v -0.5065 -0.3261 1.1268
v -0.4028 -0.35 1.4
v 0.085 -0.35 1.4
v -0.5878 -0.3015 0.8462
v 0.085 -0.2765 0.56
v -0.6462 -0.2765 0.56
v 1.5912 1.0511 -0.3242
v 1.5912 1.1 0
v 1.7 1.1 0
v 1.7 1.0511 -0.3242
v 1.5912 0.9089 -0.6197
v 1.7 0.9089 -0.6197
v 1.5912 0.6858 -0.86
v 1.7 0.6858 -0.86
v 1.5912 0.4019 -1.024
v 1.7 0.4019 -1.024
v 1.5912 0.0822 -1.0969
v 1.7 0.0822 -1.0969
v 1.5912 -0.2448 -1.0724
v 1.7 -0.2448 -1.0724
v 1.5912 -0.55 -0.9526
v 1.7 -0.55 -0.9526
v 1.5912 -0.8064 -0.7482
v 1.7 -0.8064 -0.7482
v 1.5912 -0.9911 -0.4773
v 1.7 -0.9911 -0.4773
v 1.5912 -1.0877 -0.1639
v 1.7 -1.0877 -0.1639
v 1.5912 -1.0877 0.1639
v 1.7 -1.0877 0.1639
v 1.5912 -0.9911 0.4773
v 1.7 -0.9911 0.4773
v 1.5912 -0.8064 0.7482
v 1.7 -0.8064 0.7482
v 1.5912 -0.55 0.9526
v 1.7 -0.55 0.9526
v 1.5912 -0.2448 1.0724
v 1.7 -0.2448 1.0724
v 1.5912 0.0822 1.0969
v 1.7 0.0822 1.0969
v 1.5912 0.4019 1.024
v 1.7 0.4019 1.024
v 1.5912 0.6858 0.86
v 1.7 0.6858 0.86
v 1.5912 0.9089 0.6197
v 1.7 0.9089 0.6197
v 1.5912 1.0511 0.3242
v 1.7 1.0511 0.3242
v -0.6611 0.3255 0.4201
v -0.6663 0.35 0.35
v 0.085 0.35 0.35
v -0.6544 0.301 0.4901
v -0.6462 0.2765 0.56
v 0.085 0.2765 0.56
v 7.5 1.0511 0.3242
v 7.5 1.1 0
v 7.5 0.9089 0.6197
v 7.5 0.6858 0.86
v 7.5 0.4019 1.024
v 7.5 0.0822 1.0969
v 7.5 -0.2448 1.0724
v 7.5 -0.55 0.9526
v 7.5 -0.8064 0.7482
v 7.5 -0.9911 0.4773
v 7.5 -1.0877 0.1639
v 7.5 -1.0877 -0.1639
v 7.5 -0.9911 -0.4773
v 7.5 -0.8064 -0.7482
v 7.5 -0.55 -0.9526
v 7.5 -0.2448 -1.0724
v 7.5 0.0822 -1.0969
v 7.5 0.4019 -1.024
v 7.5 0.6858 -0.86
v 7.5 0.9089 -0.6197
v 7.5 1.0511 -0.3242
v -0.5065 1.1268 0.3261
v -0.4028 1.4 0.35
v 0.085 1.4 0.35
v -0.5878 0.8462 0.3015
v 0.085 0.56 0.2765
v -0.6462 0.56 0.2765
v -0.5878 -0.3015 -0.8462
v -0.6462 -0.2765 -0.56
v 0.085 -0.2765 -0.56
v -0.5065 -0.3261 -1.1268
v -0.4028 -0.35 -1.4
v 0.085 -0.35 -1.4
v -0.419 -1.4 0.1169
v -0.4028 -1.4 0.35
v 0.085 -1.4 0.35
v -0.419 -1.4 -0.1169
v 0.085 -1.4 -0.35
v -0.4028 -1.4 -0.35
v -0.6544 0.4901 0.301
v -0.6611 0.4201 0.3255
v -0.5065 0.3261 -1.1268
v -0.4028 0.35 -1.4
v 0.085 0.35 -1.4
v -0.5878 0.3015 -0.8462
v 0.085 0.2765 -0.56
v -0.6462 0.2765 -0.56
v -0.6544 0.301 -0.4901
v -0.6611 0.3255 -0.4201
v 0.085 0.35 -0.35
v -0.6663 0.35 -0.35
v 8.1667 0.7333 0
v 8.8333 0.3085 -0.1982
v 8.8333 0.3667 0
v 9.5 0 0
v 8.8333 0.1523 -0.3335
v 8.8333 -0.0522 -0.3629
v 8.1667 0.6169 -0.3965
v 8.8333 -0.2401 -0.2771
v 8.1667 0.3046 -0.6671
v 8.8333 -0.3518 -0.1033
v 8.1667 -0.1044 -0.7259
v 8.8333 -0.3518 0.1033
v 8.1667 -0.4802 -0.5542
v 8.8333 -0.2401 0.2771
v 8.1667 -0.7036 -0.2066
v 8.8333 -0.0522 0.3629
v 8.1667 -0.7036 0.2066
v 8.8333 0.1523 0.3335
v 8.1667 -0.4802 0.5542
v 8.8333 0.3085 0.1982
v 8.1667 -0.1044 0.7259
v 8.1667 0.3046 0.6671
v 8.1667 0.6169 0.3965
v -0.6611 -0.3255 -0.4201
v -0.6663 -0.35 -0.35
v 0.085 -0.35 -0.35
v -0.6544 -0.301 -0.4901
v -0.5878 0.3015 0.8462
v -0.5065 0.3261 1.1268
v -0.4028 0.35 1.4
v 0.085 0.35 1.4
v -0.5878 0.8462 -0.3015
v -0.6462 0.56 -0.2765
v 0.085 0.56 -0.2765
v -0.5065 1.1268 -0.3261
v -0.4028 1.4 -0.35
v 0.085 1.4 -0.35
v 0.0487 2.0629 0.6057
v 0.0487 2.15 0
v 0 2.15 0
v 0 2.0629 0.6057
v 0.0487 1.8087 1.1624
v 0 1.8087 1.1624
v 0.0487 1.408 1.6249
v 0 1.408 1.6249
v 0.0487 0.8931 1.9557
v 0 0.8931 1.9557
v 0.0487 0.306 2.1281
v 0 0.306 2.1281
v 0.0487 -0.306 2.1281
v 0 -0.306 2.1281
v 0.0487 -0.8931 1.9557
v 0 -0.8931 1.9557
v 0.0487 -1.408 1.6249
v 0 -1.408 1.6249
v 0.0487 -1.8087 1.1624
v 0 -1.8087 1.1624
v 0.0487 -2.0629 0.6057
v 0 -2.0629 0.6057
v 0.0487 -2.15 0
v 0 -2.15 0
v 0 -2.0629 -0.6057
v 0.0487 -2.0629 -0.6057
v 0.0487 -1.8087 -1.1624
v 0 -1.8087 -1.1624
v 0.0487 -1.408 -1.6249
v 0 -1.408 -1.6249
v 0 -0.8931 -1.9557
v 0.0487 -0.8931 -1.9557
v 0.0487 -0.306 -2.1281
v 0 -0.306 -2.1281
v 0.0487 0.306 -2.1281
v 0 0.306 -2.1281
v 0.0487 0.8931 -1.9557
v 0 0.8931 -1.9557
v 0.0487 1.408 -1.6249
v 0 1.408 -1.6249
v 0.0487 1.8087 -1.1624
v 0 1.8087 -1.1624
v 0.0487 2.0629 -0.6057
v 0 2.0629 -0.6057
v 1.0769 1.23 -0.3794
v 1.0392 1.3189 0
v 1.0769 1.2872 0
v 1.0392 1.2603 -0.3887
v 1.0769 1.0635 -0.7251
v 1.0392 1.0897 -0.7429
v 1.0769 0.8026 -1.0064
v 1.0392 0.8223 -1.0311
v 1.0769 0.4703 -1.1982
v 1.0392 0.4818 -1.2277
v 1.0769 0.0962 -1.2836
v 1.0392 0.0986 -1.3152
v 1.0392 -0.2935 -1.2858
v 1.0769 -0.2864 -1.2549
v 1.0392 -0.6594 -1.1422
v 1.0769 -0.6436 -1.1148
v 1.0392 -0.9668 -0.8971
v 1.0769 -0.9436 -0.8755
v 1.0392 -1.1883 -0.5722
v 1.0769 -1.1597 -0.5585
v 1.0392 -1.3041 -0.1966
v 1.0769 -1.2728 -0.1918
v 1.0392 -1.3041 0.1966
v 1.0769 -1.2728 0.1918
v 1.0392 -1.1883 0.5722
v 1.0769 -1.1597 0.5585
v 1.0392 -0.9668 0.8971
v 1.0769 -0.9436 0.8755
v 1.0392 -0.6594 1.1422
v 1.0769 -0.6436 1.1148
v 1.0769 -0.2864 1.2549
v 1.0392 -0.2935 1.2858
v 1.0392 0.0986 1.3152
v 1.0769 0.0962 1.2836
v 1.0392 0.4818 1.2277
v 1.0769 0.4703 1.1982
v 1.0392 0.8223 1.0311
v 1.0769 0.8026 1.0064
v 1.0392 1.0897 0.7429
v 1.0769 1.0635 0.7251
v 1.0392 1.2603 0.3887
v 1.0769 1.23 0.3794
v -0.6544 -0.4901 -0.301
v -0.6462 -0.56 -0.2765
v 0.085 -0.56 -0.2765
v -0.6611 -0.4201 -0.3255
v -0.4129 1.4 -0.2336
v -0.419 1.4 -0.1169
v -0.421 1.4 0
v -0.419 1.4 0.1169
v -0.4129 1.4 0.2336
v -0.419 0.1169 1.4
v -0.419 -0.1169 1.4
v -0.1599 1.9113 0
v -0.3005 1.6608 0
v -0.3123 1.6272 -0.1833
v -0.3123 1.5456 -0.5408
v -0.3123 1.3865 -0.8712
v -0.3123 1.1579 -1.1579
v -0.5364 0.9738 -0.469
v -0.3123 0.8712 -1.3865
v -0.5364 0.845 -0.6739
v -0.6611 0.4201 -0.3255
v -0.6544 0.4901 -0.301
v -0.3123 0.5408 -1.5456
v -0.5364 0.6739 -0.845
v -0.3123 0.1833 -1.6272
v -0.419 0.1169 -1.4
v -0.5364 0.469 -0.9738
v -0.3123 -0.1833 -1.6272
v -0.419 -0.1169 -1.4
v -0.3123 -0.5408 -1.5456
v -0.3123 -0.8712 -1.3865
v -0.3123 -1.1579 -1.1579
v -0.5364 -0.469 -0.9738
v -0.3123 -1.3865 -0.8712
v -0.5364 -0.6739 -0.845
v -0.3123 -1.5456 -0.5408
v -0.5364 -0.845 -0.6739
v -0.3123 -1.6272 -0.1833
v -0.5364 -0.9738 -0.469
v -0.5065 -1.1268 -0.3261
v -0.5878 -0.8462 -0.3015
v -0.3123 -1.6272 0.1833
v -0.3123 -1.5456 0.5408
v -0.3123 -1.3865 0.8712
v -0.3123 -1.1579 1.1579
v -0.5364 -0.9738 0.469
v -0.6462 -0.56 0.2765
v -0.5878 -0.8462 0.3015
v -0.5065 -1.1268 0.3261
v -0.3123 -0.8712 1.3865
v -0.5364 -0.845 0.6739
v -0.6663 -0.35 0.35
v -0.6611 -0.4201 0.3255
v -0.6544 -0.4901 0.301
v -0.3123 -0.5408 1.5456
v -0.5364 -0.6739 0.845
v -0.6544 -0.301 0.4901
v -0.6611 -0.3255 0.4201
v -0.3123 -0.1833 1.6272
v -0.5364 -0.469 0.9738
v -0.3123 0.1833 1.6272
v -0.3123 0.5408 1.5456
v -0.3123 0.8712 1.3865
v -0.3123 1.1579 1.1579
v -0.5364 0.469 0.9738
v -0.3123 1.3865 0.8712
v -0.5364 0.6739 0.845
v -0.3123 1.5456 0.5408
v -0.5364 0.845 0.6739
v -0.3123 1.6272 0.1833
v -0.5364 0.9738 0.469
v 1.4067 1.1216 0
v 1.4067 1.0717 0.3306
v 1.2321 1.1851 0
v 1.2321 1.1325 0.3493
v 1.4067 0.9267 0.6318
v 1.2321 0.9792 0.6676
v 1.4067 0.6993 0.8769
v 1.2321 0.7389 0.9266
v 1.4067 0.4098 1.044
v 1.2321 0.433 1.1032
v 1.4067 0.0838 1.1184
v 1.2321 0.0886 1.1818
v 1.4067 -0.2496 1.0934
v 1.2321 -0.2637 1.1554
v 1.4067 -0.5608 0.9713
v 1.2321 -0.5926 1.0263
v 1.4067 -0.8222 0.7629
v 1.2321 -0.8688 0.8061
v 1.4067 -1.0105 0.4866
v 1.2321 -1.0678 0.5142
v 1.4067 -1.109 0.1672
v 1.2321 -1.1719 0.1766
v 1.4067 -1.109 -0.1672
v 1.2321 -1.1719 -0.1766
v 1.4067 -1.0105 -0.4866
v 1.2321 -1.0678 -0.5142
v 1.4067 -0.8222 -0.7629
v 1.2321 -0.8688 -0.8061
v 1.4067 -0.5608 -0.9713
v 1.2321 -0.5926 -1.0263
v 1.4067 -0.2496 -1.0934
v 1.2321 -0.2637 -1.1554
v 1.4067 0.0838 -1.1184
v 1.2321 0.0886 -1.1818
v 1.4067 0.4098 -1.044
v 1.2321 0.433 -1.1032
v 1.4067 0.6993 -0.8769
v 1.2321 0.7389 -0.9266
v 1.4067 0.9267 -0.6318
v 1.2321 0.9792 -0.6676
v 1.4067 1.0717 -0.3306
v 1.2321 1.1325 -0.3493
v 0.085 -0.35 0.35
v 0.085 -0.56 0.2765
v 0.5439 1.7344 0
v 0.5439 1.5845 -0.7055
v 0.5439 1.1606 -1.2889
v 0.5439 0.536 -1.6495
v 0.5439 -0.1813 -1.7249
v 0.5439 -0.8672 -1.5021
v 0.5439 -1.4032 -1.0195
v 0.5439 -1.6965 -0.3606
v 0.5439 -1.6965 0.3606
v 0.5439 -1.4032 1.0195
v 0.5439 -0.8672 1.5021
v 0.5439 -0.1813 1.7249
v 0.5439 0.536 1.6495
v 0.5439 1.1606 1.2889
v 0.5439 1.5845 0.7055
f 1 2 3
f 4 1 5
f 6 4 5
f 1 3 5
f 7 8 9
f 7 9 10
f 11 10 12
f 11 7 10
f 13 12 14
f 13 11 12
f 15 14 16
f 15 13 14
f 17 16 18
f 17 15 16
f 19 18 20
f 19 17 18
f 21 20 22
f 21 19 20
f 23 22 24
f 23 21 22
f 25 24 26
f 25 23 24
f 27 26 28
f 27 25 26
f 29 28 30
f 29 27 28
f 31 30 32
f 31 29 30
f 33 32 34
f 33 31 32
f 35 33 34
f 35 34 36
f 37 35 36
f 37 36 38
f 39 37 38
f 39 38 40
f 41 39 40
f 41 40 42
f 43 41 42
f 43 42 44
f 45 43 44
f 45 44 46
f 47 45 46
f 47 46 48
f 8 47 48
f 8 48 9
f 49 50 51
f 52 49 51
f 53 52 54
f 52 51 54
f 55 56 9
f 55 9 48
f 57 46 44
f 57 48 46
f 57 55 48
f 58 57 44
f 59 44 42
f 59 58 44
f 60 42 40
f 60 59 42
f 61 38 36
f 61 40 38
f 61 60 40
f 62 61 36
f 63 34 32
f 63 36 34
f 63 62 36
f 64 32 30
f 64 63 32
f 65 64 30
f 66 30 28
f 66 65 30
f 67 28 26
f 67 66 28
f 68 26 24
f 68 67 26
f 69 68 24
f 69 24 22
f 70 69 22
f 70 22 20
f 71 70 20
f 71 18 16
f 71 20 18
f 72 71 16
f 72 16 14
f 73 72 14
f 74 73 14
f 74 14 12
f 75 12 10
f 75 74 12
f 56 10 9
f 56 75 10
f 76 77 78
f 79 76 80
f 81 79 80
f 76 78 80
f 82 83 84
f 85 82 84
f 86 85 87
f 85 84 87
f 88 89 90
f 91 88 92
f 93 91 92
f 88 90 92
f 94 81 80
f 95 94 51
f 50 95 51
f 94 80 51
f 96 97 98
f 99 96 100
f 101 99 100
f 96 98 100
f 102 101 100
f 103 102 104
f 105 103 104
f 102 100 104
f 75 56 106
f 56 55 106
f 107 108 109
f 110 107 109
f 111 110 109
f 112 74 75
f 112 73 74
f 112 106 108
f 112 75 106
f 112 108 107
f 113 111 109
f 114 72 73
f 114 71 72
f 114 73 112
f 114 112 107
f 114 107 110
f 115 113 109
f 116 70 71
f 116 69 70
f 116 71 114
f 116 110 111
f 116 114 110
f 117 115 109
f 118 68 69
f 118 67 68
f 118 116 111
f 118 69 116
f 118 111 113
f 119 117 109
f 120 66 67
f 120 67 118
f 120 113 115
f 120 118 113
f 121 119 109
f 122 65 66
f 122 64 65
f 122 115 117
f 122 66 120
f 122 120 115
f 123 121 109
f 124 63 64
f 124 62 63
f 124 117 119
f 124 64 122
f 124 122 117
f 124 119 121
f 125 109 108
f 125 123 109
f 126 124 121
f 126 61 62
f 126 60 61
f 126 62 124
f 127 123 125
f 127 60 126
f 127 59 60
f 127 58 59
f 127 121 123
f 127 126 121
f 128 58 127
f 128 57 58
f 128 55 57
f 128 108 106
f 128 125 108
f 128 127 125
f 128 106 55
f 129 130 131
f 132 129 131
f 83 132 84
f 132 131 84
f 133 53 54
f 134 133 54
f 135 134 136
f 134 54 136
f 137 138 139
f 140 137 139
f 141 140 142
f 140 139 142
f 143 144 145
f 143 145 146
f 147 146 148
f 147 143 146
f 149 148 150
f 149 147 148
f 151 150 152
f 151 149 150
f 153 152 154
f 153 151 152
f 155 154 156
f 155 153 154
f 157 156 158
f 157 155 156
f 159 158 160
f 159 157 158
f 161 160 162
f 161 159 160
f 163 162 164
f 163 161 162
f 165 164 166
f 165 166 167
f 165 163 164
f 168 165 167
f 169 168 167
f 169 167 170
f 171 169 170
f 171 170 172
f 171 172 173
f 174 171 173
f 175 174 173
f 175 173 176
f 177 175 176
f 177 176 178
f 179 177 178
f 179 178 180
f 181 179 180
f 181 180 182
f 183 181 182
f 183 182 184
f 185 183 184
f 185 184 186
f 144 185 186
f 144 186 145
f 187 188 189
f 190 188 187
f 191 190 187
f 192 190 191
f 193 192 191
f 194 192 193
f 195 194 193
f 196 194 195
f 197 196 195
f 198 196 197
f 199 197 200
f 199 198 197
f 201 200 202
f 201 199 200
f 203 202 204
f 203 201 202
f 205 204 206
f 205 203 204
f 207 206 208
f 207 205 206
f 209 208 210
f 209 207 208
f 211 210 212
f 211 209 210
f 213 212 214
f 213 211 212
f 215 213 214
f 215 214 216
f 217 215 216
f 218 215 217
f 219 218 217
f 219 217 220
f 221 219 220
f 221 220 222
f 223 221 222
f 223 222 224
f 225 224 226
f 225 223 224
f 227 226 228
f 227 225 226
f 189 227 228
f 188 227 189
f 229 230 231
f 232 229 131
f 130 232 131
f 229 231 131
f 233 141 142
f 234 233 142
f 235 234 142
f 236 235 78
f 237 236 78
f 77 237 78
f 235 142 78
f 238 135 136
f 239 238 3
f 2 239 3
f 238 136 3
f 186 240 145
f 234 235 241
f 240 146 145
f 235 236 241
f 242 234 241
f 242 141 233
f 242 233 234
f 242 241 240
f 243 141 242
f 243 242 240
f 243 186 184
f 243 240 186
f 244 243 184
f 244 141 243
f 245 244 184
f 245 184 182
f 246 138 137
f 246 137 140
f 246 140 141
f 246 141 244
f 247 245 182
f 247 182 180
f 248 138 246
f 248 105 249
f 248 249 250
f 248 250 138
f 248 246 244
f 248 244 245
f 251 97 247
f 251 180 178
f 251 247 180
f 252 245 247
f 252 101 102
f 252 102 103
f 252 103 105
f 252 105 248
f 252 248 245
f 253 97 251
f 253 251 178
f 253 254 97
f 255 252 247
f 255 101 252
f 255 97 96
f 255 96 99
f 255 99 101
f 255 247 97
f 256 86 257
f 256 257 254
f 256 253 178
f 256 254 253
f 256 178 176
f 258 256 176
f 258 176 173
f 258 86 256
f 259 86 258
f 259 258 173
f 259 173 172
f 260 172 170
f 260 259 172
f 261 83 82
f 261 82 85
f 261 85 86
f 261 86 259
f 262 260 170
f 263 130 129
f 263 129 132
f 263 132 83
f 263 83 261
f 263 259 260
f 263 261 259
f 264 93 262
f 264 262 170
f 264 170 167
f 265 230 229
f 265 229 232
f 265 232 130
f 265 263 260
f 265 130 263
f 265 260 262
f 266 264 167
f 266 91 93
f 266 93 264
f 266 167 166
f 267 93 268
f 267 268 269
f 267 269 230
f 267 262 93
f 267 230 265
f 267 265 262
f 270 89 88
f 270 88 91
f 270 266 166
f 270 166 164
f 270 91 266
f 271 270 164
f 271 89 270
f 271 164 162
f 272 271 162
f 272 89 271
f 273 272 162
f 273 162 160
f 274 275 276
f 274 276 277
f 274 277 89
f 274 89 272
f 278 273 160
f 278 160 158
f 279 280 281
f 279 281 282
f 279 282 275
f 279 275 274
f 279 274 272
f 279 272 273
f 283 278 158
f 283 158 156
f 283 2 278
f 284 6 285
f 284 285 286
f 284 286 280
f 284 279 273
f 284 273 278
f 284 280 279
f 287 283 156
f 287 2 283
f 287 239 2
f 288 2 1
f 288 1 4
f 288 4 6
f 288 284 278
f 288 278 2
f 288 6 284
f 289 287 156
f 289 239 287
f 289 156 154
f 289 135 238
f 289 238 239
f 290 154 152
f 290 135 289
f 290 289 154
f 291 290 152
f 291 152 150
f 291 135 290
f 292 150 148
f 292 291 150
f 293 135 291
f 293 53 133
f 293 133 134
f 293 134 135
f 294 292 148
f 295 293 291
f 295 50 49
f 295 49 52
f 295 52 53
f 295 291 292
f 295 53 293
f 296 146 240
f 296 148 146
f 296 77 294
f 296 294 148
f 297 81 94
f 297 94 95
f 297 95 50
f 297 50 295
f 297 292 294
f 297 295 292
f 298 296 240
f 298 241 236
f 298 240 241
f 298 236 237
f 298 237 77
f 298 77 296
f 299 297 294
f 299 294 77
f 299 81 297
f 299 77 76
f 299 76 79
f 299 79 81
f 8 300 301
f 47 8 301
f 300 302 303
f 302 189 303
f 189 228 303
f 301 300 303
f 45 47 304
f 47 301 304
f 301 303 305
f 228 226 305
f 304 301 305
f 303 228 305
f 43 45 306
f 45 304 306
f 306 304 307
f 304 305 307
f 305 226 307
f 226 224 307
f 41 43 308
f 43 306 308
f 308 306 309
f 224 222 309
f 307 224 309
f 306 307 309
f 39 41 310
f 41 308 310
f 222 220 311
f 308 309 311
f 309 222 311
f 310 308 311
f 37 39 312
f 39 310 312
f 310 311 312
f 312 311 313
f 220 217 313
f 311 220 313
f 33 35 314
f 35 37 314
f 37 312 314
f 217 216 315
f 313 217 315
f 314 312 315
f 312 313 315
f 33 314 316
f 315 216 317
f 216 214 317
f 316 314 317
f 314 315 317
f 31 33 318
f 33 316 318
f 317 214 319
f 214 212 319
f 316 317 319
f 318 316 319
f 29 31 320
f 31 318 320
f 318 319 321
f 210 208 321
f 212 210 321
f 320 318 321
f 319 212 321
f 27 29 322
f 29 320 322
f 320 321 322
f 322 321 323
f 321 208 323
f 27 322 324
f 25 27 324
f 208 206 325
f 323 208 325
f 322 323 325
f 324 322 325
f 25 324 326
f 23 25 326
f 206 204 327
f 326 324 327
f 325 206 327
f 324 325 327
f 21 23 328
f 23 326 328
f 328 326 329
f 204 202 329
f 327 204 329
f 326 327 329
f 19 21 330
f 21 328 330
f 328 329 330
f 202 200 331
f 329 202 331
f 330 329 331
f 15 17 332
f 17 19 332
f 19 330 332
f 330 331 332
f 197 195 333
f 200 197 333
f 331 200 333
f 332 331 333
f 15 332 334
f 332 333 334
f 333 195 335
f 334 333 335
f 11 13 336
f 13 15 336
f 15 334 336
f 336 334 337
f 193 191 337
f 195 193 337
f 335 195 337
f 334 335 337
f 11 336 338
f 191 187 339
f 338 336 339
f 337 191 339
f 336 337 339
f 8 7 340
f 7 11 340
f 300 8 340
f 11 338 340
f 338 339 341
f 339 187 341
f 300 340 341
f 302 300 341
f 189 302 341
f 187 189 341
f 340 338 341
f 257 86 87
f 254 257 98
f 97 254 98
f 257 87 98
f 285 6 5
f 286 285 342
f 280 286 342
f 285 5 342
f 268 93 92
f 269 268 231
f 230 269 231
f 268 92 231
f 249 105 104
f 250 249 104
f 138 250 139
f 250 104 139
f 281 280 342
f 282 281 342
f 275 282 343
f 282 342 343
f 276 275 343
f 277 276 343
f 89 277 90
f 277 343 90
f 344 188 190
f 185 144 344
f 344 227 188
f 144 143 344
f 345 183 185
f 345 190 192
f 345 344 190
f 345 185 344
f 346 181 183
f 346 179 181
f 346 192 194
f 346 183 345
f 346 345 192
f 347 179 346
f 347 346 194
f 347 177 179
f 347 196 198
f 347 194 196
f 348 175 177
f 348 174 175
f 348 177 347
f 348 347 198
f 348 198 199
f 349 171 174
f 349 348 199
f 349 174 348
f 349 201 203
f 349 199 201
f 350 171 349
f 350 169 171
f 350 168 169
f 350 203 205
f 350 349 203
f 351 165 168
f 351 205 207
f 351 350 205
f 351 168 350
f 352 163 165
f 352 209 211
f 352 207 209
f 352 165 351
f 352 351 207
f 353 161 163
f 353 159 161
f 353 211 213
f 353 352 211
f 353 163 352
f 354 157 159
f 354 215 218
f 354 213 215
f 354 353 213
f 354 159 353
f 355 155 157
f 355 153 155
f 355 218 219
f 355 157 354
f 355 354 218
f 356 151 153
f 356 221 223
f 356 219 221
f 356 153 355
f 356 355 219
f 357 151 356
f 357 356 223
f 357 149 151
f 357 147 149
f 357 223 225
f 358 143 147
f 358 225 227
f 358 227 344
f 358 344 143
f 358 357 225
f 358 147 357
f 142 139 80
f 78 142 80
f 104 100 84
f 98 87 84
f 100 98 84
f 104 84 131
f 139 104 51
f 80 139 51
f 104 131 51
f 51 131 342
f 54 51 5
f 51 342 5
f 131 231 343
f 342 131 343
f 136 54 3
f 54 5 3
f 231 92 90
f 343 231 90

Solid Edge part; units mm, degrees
sketch "Sketch1" plane through (0, 0, 0) normal (0, 0, 1) x (1, 0, 0)
  line L0 (-0.7, 0) -> (-0.7, 2.15)
  line L1 (-0.7, 2.15) -> (0.0487, 2.15)
  line L2 (0.0487, 2.15) -> (1.3, 1.1)
  line L3 (1.3, 1.1) -> (7.5, 1.1)
  line L4 (7.5, 1.1) -> (9.5, 0)
  line L5 (9.5, 0) -> (-0.7, 0)
revolve "RevolvedProtrusion1" add sketch "Sketch1" angle 360 about axis through (9.5, 0, 0) along (-1, 0, 0)
cosmetic_thread "Thread1" size "M2.2"
sketch "Sketch2" plane through (0, 0, 0) normal (0, 0, 1) x (1, 0, 0)
  line L0 (-0.83, 0) -> (-0.83, 2.365)
  line L1 (-0.83, 2.365) -> (0, 2.365)
  line L2 (0, 2.365) -> (0, 2.15)
  arc A0 (0, 2.15) -> (-0.7, 0) centre (2.9518, 0) ccw
  line L3 (-0.7, 0) -> (-0.83, 0)
revolve "RevolvedCutout1" cut sketch "Sketch2" angle 360 about axis through (-0.7, 0, 0) along (-1, 0, 0)
sketch "Sketch3" plane through (0, 0, 0) normal (0, 0, 1) x (1, 0, 0)
  line L0 (0.9, 0.9) -> (1.7, 0.9)
  line L1 (1.7, 0.9) -> (1.7, 1.1)
  line L2 (1.7, 1.1) -> (1.5912, 1.1)
  arc A0 (1.5912, 1.1) -> (1.0769, 1.2872) centre (1.5912, 1.9) cw
  line L3 (1.0769, 1.2872) -> (0.9, 1.4356)
  line L4 (0.9, 1.4356) -> (0.9, 0.9)
revolve "RevolvedProtrusion2" add sketch "Sketch3" angle 360 about axis through (1.7, 0, 0) along (-1, 0, 0)
sketch "Sketch4" plane through (-0.7, 0, 0) normal (1, 0, 0) x (0, 1, 0)
  line L0 (-0.35, 1.4) -> (-0.2765, 0.56)
  line L1 (-0.2765, 0.56) -> (-0.35, 0.35)
  line L2 (-0.35, 0.35) -> (-0.56, 0.2765)
  line L3 (-0.56, 0.2765) -> (-1.4, 0.35)
  line L4 (-1.4, 0.35) -> (-1.4, -0.35)
  line L5 (-1.4, -0.35) -> (-0.56, -0.2765)
  line L6 (-0.56, -0.2765) -> (-0.35, -0.35)
  line L7 (-0.35, -0.35) -> (-0.2765, -0.56)
  line L8 (-0.2765, -0.56) -> (-0.35, -1.4)
  line L9 (-0.35, -1.4) -> (0.35, -1.4)
  line L10 (0.35, -1.4) -> (0.2765, -0.56)
  line L11 (0.2765, -0.56) -> (0.35, -0.35)
  line L12 (0.35, -0.35) -> (0.56, -0.2765)
  line L13 (0.56, -0.2765) -> (1.4, -0.35)
  line L14 (1.4, -0.35) -> (1.4, 0.35)
  line L15 (1.4, 0.35) -> (0.56, 0.2765)
  line L16 (0.56, 0.2765) -> (0.35, 0.35)
  line L17 (0.35, 0.35) -> (0.2765, 0.56)
  line L18 (0.2765, 0.56) -> (0.35, 1.4)
  line L19 (0.35, 1.4) -> (-0.35, 1.4)
extrude "ExtrudedCutout_1" cut sketch "Sketch4" against normal blind 0.785 and the other way blind 0.785
properties part number "Tapping screw DIN 7983 ST2.2x9.5-C-H 55690.022.009(High)"
